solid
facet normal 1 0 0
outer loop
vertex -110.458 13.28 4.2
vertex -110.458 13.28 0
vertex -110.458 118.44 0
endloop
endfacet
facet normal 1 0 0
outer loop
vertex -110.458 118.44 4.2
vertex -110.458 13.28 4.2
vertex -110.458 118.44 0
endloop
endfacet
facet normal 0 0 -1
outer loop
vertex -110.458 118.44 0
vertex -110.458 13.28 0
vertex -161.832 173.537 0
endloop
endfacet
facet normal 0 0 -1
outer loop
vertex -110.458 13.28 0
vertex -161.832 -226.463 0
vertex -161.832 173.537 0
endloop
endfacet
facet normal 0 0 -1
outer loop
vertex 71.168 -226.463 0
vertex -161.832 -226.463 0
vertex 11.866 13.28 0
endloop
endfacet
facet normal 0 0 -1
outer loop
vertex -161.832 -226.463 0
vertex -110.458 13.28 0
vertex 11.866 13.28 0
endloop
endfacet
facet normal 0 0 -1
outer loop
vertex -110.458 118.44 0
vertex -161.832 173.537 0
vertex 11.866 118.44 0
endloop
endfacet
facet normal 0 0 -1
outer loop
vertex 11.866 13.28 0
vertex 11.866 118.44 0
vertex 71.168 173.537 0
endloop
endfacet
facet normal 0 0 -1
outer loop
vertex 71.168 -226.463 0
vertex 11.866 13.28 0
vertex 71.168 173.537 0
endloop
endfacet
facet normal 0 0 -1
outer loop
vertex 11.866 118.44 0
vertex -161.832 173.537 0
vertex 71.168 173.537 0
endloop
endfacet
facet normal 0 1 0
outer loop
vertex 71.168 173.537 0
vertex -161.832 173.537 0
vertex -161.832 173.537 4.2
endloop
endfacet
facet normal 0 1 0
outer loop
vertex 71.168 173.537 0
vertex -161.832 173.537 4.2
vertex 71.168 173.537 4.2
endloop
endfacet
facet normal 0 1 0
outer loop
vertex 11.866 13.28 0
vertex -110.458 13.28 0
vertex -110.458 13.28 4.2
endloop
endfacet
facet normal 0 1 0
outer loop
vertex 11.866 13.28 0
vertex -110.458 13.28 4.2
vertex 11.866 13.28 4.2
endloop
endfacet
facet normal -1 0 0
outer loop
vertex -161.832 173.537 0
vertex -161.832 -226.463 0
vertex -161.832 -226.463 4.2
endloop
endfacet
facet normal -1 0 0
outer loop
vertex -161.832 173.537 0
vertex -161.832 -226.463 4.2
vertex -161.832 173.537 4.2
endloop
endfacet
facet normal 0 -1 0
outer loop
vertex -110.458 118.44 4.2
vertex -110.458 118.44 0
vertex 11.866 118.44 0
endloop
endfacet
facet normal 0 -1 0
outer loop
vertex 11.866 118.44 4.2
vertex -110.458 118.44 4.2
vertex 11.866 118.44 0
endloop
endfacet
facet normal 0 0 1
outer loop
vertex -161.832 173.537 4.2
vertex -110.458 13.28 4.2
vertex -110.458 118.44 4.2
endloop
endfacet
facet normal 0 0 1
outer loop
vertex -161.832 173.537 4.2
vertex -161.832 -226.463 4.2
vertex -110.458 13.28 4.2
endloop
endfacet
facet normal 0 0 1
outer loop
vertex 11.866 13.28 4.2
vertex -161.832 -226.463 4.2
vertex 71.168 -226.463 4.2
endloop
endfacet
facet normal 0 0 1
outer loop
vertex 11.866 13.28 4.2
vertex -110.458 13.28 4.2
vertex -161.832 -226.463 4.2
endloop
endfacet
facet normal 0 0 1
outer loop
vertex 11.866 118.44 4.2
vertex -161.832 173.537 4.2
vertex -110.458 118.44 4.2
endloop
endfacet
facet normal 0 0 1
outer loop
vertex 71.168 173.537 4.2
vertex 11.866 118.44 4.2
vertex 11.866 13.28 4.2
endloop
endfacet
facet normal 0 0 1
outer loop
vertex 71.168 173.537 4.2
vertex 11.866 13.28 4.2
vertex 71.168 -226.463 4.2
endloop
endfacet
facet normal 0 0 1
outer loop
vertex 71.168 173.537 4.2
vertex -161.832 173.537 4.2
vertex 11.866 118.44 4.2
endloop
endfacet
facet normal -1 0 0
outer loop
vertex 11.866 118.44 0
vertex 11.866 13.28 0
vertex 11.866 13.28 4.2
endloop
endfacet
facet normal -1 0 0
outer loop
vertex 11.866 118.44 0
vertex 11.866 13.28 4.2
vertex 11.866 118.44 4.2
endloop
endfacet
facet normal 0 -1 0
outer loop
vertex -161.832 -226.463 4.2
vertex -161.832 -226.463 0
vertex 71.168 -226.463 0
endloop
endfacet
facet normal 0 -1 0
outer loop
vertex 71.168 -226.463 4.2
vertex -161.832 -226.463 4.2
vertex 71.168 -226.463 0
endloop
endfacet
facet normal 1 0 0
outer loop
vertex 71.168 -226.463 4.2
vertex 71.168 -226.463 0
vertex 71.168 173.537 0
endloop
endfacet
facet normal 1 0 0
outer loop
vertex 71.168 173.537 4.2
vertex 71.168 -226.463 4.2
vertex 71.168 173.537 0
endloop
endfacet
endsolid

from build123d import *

# Parameters (mm, degrees)
ESQUISSE1_W                  = 233
ESQUISSE1_H                  = 400
BOSS_EXTRU_1_DEPTH           = 4.2
ENL_V_MAT_EXTRU_1_DEPTH      = 279.375274783
ENL_V_MAT_EXTRU_1_DEPTH_BACK = 279.375274783
ESQUISSE2_W                  = 122.323690039
ESQUISSE2_H                  = 105.15953143


with BuildPart() as part:
    # Esquisse1 → Boss.-Extru.1 (new body)
    with BuildSketch(Plane.XY):
        with Locations((-45.332061069, -26.463104326)):
            Rectangle(ESQUISSE1_W, ESQUISSE1_H)
    extrude(amount=BOSS_EXTRU_1_DEPTH)

    # Esquisse2 → Enlèv. mat.-Extru.1 (cut, two sides: drawn at the far end of the back side and taken through both)
    with BuildSketch(Plane.XY.offset(4.2).offset(-ENL_V_MAT_EXTRU_1_DEPTH_BACK)):
        with Locations((-49.296189184, 65.859991666)):
            Rectangle(ESQUISSE2_W, ESQUISSE2_H)
    extrude(amount=ENL_V_MAT_EXTRU_1_DEPTH + ENL_V_MAT_EXTRU_1_DEPTH_BACK, mode=Mode.SUBTRACT)


solid = part.part
